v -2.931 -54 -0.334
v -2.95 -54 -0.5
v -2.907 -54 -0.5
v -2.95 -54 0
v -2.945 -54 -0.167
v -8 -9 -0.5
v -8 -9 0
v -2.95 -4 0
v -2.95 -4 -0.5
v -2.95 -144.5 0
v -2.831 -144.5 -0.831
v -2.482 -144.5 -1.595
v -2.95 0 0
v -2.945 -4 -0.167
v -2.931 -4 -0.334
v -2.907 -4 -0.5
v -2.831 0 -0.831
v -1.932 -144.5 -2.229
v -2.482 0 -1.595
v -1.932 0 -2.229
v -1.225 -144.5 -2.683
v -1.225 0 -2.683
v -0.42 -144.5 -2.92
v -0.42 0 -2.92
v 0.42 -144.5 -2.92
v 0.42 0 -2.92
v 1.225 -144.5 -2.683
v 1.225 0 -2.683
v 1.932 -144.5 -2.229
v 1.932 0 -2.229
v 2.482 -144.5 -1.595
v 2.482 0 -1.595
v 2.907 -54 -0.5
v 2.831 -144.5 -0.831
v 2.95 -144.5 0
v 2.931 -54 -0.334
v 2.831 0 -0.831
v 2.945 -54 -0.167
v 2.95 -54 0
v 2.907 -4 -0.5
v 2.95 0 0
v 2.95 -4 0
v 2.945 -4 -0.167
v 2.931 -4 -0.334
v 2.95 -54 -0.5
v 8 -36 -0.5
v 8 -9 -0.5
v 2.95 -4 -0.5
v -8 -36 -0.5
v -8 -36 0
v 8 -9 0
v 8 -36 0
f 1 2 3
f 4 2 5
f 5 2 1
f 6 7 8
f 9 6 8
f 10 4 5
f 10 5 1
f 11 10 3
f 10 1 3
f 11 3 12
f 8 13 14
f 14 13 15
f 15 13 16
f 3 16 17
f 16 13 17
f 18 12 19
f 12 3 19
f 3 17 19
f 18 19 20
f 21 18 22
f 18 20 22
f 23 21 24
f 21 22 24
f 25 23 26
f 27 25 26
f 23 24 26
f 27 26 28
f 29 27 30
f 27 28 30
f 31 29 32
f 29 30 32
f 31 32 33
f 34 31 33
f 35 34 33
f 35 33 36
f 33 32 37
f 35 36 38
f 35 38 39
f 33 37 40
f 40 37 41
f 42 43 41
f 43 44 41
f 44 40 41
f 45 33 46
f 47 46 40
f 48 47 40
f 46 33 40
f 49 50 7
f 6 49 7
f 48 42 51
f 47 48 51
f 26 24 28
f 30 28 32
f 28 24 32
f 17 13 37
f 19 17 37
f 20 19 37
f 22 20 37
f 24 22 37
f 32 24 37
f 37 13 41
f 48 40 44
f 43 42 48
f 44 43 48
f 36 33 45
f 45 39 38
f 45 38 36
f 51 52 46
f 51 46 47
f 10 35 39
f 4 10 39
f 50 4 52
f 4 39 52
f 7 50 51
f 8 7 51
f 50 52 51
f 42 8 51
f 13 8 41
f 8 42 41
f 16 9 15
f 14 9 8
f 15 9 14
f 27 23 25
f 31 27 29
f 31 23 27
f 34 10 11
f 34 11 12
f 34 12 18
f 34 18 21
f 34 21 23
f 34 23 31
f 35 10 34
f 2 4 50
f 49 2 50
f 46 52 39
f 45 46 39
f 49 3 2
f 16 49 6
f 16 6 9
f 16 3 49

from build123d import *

# Parameters (mm, degrees)
F1_DEPTH      = 144.5
F2_W          = 50
F2_H          = 0.5
F3_DEPTH      = 8
F3_DEPTH_BACK = 8
F4_DEPTH      = 0.5
F5_DEPTH      = 6
F6_DEPTH      = 0.5
F8_DEPTH      = 0.5


with BuildPart() as f1:
    # F0 (on Front) → F1 (new body)
    with BuildSketch(Plane.XZ):
        with BuildLine():
            ThreePointArc((-2.95, 0), (0, -2.95), (2.95, 0))
            Line((2.95, 0), (-2.95, 0))
        make_face()
    extrude(amount=F1_DEPTH)

    # F2 (on Right) → F3 (join, two sides)
    with BuildSketch(Plane.YZ) as f3_sk:
        with Locations((-29, 0.25)):
            Rectangle(F2_W, F2_H)
    extrude(amount=F3_DEPTH)
    extrude(f3_sk.sketch, amount=-F3_DEPTH_BACK)

    # F4 (add): faces of the model
    f4_faces = [f1.faces().sort_by_distance(p)[0] for p in [
        (5.475, -29, 0),
        (-5.475, -29, 0),
    ]]
    extrude(f4_faces, amount=F4_DEPTH)

    # F5 (add): a face of the model
    f5_faces = [f1.faces().sort_by_distance(p)[0] for p in [
        (-2.95, -29, -0.25),
    ]]
    extrude(f5_faces, amount=F5_DEPTH)

    # F6 (cut): a face of the model
    f6_faces = [f1.faces().sort_by_distance(p)[0] for p in [
        (0, -29, 0.5),
    ]]
    extrude(f6_faces, amount=-F6_DEPTH, mode=Mode.SUBTRACT)

    # F7 (on face) → F8 (cut)
    with BuildSketch(Plane.XY):
        Polygon((-8, -9), (-2.95, -4), (-8, -4), align=None)
        Polygon((-2.95, -54), (-8, -36), (-8, -54), align=None)
        Polygon((8, -54), (8, -36), (2.95, -54), align=None)
        Polygon((8, -4), (2.95, -4), (8, -9), align=None)
    extrude(amount=-F8_DEPTH, mode=Mode.SUBTRACT)


solid = f1.part
